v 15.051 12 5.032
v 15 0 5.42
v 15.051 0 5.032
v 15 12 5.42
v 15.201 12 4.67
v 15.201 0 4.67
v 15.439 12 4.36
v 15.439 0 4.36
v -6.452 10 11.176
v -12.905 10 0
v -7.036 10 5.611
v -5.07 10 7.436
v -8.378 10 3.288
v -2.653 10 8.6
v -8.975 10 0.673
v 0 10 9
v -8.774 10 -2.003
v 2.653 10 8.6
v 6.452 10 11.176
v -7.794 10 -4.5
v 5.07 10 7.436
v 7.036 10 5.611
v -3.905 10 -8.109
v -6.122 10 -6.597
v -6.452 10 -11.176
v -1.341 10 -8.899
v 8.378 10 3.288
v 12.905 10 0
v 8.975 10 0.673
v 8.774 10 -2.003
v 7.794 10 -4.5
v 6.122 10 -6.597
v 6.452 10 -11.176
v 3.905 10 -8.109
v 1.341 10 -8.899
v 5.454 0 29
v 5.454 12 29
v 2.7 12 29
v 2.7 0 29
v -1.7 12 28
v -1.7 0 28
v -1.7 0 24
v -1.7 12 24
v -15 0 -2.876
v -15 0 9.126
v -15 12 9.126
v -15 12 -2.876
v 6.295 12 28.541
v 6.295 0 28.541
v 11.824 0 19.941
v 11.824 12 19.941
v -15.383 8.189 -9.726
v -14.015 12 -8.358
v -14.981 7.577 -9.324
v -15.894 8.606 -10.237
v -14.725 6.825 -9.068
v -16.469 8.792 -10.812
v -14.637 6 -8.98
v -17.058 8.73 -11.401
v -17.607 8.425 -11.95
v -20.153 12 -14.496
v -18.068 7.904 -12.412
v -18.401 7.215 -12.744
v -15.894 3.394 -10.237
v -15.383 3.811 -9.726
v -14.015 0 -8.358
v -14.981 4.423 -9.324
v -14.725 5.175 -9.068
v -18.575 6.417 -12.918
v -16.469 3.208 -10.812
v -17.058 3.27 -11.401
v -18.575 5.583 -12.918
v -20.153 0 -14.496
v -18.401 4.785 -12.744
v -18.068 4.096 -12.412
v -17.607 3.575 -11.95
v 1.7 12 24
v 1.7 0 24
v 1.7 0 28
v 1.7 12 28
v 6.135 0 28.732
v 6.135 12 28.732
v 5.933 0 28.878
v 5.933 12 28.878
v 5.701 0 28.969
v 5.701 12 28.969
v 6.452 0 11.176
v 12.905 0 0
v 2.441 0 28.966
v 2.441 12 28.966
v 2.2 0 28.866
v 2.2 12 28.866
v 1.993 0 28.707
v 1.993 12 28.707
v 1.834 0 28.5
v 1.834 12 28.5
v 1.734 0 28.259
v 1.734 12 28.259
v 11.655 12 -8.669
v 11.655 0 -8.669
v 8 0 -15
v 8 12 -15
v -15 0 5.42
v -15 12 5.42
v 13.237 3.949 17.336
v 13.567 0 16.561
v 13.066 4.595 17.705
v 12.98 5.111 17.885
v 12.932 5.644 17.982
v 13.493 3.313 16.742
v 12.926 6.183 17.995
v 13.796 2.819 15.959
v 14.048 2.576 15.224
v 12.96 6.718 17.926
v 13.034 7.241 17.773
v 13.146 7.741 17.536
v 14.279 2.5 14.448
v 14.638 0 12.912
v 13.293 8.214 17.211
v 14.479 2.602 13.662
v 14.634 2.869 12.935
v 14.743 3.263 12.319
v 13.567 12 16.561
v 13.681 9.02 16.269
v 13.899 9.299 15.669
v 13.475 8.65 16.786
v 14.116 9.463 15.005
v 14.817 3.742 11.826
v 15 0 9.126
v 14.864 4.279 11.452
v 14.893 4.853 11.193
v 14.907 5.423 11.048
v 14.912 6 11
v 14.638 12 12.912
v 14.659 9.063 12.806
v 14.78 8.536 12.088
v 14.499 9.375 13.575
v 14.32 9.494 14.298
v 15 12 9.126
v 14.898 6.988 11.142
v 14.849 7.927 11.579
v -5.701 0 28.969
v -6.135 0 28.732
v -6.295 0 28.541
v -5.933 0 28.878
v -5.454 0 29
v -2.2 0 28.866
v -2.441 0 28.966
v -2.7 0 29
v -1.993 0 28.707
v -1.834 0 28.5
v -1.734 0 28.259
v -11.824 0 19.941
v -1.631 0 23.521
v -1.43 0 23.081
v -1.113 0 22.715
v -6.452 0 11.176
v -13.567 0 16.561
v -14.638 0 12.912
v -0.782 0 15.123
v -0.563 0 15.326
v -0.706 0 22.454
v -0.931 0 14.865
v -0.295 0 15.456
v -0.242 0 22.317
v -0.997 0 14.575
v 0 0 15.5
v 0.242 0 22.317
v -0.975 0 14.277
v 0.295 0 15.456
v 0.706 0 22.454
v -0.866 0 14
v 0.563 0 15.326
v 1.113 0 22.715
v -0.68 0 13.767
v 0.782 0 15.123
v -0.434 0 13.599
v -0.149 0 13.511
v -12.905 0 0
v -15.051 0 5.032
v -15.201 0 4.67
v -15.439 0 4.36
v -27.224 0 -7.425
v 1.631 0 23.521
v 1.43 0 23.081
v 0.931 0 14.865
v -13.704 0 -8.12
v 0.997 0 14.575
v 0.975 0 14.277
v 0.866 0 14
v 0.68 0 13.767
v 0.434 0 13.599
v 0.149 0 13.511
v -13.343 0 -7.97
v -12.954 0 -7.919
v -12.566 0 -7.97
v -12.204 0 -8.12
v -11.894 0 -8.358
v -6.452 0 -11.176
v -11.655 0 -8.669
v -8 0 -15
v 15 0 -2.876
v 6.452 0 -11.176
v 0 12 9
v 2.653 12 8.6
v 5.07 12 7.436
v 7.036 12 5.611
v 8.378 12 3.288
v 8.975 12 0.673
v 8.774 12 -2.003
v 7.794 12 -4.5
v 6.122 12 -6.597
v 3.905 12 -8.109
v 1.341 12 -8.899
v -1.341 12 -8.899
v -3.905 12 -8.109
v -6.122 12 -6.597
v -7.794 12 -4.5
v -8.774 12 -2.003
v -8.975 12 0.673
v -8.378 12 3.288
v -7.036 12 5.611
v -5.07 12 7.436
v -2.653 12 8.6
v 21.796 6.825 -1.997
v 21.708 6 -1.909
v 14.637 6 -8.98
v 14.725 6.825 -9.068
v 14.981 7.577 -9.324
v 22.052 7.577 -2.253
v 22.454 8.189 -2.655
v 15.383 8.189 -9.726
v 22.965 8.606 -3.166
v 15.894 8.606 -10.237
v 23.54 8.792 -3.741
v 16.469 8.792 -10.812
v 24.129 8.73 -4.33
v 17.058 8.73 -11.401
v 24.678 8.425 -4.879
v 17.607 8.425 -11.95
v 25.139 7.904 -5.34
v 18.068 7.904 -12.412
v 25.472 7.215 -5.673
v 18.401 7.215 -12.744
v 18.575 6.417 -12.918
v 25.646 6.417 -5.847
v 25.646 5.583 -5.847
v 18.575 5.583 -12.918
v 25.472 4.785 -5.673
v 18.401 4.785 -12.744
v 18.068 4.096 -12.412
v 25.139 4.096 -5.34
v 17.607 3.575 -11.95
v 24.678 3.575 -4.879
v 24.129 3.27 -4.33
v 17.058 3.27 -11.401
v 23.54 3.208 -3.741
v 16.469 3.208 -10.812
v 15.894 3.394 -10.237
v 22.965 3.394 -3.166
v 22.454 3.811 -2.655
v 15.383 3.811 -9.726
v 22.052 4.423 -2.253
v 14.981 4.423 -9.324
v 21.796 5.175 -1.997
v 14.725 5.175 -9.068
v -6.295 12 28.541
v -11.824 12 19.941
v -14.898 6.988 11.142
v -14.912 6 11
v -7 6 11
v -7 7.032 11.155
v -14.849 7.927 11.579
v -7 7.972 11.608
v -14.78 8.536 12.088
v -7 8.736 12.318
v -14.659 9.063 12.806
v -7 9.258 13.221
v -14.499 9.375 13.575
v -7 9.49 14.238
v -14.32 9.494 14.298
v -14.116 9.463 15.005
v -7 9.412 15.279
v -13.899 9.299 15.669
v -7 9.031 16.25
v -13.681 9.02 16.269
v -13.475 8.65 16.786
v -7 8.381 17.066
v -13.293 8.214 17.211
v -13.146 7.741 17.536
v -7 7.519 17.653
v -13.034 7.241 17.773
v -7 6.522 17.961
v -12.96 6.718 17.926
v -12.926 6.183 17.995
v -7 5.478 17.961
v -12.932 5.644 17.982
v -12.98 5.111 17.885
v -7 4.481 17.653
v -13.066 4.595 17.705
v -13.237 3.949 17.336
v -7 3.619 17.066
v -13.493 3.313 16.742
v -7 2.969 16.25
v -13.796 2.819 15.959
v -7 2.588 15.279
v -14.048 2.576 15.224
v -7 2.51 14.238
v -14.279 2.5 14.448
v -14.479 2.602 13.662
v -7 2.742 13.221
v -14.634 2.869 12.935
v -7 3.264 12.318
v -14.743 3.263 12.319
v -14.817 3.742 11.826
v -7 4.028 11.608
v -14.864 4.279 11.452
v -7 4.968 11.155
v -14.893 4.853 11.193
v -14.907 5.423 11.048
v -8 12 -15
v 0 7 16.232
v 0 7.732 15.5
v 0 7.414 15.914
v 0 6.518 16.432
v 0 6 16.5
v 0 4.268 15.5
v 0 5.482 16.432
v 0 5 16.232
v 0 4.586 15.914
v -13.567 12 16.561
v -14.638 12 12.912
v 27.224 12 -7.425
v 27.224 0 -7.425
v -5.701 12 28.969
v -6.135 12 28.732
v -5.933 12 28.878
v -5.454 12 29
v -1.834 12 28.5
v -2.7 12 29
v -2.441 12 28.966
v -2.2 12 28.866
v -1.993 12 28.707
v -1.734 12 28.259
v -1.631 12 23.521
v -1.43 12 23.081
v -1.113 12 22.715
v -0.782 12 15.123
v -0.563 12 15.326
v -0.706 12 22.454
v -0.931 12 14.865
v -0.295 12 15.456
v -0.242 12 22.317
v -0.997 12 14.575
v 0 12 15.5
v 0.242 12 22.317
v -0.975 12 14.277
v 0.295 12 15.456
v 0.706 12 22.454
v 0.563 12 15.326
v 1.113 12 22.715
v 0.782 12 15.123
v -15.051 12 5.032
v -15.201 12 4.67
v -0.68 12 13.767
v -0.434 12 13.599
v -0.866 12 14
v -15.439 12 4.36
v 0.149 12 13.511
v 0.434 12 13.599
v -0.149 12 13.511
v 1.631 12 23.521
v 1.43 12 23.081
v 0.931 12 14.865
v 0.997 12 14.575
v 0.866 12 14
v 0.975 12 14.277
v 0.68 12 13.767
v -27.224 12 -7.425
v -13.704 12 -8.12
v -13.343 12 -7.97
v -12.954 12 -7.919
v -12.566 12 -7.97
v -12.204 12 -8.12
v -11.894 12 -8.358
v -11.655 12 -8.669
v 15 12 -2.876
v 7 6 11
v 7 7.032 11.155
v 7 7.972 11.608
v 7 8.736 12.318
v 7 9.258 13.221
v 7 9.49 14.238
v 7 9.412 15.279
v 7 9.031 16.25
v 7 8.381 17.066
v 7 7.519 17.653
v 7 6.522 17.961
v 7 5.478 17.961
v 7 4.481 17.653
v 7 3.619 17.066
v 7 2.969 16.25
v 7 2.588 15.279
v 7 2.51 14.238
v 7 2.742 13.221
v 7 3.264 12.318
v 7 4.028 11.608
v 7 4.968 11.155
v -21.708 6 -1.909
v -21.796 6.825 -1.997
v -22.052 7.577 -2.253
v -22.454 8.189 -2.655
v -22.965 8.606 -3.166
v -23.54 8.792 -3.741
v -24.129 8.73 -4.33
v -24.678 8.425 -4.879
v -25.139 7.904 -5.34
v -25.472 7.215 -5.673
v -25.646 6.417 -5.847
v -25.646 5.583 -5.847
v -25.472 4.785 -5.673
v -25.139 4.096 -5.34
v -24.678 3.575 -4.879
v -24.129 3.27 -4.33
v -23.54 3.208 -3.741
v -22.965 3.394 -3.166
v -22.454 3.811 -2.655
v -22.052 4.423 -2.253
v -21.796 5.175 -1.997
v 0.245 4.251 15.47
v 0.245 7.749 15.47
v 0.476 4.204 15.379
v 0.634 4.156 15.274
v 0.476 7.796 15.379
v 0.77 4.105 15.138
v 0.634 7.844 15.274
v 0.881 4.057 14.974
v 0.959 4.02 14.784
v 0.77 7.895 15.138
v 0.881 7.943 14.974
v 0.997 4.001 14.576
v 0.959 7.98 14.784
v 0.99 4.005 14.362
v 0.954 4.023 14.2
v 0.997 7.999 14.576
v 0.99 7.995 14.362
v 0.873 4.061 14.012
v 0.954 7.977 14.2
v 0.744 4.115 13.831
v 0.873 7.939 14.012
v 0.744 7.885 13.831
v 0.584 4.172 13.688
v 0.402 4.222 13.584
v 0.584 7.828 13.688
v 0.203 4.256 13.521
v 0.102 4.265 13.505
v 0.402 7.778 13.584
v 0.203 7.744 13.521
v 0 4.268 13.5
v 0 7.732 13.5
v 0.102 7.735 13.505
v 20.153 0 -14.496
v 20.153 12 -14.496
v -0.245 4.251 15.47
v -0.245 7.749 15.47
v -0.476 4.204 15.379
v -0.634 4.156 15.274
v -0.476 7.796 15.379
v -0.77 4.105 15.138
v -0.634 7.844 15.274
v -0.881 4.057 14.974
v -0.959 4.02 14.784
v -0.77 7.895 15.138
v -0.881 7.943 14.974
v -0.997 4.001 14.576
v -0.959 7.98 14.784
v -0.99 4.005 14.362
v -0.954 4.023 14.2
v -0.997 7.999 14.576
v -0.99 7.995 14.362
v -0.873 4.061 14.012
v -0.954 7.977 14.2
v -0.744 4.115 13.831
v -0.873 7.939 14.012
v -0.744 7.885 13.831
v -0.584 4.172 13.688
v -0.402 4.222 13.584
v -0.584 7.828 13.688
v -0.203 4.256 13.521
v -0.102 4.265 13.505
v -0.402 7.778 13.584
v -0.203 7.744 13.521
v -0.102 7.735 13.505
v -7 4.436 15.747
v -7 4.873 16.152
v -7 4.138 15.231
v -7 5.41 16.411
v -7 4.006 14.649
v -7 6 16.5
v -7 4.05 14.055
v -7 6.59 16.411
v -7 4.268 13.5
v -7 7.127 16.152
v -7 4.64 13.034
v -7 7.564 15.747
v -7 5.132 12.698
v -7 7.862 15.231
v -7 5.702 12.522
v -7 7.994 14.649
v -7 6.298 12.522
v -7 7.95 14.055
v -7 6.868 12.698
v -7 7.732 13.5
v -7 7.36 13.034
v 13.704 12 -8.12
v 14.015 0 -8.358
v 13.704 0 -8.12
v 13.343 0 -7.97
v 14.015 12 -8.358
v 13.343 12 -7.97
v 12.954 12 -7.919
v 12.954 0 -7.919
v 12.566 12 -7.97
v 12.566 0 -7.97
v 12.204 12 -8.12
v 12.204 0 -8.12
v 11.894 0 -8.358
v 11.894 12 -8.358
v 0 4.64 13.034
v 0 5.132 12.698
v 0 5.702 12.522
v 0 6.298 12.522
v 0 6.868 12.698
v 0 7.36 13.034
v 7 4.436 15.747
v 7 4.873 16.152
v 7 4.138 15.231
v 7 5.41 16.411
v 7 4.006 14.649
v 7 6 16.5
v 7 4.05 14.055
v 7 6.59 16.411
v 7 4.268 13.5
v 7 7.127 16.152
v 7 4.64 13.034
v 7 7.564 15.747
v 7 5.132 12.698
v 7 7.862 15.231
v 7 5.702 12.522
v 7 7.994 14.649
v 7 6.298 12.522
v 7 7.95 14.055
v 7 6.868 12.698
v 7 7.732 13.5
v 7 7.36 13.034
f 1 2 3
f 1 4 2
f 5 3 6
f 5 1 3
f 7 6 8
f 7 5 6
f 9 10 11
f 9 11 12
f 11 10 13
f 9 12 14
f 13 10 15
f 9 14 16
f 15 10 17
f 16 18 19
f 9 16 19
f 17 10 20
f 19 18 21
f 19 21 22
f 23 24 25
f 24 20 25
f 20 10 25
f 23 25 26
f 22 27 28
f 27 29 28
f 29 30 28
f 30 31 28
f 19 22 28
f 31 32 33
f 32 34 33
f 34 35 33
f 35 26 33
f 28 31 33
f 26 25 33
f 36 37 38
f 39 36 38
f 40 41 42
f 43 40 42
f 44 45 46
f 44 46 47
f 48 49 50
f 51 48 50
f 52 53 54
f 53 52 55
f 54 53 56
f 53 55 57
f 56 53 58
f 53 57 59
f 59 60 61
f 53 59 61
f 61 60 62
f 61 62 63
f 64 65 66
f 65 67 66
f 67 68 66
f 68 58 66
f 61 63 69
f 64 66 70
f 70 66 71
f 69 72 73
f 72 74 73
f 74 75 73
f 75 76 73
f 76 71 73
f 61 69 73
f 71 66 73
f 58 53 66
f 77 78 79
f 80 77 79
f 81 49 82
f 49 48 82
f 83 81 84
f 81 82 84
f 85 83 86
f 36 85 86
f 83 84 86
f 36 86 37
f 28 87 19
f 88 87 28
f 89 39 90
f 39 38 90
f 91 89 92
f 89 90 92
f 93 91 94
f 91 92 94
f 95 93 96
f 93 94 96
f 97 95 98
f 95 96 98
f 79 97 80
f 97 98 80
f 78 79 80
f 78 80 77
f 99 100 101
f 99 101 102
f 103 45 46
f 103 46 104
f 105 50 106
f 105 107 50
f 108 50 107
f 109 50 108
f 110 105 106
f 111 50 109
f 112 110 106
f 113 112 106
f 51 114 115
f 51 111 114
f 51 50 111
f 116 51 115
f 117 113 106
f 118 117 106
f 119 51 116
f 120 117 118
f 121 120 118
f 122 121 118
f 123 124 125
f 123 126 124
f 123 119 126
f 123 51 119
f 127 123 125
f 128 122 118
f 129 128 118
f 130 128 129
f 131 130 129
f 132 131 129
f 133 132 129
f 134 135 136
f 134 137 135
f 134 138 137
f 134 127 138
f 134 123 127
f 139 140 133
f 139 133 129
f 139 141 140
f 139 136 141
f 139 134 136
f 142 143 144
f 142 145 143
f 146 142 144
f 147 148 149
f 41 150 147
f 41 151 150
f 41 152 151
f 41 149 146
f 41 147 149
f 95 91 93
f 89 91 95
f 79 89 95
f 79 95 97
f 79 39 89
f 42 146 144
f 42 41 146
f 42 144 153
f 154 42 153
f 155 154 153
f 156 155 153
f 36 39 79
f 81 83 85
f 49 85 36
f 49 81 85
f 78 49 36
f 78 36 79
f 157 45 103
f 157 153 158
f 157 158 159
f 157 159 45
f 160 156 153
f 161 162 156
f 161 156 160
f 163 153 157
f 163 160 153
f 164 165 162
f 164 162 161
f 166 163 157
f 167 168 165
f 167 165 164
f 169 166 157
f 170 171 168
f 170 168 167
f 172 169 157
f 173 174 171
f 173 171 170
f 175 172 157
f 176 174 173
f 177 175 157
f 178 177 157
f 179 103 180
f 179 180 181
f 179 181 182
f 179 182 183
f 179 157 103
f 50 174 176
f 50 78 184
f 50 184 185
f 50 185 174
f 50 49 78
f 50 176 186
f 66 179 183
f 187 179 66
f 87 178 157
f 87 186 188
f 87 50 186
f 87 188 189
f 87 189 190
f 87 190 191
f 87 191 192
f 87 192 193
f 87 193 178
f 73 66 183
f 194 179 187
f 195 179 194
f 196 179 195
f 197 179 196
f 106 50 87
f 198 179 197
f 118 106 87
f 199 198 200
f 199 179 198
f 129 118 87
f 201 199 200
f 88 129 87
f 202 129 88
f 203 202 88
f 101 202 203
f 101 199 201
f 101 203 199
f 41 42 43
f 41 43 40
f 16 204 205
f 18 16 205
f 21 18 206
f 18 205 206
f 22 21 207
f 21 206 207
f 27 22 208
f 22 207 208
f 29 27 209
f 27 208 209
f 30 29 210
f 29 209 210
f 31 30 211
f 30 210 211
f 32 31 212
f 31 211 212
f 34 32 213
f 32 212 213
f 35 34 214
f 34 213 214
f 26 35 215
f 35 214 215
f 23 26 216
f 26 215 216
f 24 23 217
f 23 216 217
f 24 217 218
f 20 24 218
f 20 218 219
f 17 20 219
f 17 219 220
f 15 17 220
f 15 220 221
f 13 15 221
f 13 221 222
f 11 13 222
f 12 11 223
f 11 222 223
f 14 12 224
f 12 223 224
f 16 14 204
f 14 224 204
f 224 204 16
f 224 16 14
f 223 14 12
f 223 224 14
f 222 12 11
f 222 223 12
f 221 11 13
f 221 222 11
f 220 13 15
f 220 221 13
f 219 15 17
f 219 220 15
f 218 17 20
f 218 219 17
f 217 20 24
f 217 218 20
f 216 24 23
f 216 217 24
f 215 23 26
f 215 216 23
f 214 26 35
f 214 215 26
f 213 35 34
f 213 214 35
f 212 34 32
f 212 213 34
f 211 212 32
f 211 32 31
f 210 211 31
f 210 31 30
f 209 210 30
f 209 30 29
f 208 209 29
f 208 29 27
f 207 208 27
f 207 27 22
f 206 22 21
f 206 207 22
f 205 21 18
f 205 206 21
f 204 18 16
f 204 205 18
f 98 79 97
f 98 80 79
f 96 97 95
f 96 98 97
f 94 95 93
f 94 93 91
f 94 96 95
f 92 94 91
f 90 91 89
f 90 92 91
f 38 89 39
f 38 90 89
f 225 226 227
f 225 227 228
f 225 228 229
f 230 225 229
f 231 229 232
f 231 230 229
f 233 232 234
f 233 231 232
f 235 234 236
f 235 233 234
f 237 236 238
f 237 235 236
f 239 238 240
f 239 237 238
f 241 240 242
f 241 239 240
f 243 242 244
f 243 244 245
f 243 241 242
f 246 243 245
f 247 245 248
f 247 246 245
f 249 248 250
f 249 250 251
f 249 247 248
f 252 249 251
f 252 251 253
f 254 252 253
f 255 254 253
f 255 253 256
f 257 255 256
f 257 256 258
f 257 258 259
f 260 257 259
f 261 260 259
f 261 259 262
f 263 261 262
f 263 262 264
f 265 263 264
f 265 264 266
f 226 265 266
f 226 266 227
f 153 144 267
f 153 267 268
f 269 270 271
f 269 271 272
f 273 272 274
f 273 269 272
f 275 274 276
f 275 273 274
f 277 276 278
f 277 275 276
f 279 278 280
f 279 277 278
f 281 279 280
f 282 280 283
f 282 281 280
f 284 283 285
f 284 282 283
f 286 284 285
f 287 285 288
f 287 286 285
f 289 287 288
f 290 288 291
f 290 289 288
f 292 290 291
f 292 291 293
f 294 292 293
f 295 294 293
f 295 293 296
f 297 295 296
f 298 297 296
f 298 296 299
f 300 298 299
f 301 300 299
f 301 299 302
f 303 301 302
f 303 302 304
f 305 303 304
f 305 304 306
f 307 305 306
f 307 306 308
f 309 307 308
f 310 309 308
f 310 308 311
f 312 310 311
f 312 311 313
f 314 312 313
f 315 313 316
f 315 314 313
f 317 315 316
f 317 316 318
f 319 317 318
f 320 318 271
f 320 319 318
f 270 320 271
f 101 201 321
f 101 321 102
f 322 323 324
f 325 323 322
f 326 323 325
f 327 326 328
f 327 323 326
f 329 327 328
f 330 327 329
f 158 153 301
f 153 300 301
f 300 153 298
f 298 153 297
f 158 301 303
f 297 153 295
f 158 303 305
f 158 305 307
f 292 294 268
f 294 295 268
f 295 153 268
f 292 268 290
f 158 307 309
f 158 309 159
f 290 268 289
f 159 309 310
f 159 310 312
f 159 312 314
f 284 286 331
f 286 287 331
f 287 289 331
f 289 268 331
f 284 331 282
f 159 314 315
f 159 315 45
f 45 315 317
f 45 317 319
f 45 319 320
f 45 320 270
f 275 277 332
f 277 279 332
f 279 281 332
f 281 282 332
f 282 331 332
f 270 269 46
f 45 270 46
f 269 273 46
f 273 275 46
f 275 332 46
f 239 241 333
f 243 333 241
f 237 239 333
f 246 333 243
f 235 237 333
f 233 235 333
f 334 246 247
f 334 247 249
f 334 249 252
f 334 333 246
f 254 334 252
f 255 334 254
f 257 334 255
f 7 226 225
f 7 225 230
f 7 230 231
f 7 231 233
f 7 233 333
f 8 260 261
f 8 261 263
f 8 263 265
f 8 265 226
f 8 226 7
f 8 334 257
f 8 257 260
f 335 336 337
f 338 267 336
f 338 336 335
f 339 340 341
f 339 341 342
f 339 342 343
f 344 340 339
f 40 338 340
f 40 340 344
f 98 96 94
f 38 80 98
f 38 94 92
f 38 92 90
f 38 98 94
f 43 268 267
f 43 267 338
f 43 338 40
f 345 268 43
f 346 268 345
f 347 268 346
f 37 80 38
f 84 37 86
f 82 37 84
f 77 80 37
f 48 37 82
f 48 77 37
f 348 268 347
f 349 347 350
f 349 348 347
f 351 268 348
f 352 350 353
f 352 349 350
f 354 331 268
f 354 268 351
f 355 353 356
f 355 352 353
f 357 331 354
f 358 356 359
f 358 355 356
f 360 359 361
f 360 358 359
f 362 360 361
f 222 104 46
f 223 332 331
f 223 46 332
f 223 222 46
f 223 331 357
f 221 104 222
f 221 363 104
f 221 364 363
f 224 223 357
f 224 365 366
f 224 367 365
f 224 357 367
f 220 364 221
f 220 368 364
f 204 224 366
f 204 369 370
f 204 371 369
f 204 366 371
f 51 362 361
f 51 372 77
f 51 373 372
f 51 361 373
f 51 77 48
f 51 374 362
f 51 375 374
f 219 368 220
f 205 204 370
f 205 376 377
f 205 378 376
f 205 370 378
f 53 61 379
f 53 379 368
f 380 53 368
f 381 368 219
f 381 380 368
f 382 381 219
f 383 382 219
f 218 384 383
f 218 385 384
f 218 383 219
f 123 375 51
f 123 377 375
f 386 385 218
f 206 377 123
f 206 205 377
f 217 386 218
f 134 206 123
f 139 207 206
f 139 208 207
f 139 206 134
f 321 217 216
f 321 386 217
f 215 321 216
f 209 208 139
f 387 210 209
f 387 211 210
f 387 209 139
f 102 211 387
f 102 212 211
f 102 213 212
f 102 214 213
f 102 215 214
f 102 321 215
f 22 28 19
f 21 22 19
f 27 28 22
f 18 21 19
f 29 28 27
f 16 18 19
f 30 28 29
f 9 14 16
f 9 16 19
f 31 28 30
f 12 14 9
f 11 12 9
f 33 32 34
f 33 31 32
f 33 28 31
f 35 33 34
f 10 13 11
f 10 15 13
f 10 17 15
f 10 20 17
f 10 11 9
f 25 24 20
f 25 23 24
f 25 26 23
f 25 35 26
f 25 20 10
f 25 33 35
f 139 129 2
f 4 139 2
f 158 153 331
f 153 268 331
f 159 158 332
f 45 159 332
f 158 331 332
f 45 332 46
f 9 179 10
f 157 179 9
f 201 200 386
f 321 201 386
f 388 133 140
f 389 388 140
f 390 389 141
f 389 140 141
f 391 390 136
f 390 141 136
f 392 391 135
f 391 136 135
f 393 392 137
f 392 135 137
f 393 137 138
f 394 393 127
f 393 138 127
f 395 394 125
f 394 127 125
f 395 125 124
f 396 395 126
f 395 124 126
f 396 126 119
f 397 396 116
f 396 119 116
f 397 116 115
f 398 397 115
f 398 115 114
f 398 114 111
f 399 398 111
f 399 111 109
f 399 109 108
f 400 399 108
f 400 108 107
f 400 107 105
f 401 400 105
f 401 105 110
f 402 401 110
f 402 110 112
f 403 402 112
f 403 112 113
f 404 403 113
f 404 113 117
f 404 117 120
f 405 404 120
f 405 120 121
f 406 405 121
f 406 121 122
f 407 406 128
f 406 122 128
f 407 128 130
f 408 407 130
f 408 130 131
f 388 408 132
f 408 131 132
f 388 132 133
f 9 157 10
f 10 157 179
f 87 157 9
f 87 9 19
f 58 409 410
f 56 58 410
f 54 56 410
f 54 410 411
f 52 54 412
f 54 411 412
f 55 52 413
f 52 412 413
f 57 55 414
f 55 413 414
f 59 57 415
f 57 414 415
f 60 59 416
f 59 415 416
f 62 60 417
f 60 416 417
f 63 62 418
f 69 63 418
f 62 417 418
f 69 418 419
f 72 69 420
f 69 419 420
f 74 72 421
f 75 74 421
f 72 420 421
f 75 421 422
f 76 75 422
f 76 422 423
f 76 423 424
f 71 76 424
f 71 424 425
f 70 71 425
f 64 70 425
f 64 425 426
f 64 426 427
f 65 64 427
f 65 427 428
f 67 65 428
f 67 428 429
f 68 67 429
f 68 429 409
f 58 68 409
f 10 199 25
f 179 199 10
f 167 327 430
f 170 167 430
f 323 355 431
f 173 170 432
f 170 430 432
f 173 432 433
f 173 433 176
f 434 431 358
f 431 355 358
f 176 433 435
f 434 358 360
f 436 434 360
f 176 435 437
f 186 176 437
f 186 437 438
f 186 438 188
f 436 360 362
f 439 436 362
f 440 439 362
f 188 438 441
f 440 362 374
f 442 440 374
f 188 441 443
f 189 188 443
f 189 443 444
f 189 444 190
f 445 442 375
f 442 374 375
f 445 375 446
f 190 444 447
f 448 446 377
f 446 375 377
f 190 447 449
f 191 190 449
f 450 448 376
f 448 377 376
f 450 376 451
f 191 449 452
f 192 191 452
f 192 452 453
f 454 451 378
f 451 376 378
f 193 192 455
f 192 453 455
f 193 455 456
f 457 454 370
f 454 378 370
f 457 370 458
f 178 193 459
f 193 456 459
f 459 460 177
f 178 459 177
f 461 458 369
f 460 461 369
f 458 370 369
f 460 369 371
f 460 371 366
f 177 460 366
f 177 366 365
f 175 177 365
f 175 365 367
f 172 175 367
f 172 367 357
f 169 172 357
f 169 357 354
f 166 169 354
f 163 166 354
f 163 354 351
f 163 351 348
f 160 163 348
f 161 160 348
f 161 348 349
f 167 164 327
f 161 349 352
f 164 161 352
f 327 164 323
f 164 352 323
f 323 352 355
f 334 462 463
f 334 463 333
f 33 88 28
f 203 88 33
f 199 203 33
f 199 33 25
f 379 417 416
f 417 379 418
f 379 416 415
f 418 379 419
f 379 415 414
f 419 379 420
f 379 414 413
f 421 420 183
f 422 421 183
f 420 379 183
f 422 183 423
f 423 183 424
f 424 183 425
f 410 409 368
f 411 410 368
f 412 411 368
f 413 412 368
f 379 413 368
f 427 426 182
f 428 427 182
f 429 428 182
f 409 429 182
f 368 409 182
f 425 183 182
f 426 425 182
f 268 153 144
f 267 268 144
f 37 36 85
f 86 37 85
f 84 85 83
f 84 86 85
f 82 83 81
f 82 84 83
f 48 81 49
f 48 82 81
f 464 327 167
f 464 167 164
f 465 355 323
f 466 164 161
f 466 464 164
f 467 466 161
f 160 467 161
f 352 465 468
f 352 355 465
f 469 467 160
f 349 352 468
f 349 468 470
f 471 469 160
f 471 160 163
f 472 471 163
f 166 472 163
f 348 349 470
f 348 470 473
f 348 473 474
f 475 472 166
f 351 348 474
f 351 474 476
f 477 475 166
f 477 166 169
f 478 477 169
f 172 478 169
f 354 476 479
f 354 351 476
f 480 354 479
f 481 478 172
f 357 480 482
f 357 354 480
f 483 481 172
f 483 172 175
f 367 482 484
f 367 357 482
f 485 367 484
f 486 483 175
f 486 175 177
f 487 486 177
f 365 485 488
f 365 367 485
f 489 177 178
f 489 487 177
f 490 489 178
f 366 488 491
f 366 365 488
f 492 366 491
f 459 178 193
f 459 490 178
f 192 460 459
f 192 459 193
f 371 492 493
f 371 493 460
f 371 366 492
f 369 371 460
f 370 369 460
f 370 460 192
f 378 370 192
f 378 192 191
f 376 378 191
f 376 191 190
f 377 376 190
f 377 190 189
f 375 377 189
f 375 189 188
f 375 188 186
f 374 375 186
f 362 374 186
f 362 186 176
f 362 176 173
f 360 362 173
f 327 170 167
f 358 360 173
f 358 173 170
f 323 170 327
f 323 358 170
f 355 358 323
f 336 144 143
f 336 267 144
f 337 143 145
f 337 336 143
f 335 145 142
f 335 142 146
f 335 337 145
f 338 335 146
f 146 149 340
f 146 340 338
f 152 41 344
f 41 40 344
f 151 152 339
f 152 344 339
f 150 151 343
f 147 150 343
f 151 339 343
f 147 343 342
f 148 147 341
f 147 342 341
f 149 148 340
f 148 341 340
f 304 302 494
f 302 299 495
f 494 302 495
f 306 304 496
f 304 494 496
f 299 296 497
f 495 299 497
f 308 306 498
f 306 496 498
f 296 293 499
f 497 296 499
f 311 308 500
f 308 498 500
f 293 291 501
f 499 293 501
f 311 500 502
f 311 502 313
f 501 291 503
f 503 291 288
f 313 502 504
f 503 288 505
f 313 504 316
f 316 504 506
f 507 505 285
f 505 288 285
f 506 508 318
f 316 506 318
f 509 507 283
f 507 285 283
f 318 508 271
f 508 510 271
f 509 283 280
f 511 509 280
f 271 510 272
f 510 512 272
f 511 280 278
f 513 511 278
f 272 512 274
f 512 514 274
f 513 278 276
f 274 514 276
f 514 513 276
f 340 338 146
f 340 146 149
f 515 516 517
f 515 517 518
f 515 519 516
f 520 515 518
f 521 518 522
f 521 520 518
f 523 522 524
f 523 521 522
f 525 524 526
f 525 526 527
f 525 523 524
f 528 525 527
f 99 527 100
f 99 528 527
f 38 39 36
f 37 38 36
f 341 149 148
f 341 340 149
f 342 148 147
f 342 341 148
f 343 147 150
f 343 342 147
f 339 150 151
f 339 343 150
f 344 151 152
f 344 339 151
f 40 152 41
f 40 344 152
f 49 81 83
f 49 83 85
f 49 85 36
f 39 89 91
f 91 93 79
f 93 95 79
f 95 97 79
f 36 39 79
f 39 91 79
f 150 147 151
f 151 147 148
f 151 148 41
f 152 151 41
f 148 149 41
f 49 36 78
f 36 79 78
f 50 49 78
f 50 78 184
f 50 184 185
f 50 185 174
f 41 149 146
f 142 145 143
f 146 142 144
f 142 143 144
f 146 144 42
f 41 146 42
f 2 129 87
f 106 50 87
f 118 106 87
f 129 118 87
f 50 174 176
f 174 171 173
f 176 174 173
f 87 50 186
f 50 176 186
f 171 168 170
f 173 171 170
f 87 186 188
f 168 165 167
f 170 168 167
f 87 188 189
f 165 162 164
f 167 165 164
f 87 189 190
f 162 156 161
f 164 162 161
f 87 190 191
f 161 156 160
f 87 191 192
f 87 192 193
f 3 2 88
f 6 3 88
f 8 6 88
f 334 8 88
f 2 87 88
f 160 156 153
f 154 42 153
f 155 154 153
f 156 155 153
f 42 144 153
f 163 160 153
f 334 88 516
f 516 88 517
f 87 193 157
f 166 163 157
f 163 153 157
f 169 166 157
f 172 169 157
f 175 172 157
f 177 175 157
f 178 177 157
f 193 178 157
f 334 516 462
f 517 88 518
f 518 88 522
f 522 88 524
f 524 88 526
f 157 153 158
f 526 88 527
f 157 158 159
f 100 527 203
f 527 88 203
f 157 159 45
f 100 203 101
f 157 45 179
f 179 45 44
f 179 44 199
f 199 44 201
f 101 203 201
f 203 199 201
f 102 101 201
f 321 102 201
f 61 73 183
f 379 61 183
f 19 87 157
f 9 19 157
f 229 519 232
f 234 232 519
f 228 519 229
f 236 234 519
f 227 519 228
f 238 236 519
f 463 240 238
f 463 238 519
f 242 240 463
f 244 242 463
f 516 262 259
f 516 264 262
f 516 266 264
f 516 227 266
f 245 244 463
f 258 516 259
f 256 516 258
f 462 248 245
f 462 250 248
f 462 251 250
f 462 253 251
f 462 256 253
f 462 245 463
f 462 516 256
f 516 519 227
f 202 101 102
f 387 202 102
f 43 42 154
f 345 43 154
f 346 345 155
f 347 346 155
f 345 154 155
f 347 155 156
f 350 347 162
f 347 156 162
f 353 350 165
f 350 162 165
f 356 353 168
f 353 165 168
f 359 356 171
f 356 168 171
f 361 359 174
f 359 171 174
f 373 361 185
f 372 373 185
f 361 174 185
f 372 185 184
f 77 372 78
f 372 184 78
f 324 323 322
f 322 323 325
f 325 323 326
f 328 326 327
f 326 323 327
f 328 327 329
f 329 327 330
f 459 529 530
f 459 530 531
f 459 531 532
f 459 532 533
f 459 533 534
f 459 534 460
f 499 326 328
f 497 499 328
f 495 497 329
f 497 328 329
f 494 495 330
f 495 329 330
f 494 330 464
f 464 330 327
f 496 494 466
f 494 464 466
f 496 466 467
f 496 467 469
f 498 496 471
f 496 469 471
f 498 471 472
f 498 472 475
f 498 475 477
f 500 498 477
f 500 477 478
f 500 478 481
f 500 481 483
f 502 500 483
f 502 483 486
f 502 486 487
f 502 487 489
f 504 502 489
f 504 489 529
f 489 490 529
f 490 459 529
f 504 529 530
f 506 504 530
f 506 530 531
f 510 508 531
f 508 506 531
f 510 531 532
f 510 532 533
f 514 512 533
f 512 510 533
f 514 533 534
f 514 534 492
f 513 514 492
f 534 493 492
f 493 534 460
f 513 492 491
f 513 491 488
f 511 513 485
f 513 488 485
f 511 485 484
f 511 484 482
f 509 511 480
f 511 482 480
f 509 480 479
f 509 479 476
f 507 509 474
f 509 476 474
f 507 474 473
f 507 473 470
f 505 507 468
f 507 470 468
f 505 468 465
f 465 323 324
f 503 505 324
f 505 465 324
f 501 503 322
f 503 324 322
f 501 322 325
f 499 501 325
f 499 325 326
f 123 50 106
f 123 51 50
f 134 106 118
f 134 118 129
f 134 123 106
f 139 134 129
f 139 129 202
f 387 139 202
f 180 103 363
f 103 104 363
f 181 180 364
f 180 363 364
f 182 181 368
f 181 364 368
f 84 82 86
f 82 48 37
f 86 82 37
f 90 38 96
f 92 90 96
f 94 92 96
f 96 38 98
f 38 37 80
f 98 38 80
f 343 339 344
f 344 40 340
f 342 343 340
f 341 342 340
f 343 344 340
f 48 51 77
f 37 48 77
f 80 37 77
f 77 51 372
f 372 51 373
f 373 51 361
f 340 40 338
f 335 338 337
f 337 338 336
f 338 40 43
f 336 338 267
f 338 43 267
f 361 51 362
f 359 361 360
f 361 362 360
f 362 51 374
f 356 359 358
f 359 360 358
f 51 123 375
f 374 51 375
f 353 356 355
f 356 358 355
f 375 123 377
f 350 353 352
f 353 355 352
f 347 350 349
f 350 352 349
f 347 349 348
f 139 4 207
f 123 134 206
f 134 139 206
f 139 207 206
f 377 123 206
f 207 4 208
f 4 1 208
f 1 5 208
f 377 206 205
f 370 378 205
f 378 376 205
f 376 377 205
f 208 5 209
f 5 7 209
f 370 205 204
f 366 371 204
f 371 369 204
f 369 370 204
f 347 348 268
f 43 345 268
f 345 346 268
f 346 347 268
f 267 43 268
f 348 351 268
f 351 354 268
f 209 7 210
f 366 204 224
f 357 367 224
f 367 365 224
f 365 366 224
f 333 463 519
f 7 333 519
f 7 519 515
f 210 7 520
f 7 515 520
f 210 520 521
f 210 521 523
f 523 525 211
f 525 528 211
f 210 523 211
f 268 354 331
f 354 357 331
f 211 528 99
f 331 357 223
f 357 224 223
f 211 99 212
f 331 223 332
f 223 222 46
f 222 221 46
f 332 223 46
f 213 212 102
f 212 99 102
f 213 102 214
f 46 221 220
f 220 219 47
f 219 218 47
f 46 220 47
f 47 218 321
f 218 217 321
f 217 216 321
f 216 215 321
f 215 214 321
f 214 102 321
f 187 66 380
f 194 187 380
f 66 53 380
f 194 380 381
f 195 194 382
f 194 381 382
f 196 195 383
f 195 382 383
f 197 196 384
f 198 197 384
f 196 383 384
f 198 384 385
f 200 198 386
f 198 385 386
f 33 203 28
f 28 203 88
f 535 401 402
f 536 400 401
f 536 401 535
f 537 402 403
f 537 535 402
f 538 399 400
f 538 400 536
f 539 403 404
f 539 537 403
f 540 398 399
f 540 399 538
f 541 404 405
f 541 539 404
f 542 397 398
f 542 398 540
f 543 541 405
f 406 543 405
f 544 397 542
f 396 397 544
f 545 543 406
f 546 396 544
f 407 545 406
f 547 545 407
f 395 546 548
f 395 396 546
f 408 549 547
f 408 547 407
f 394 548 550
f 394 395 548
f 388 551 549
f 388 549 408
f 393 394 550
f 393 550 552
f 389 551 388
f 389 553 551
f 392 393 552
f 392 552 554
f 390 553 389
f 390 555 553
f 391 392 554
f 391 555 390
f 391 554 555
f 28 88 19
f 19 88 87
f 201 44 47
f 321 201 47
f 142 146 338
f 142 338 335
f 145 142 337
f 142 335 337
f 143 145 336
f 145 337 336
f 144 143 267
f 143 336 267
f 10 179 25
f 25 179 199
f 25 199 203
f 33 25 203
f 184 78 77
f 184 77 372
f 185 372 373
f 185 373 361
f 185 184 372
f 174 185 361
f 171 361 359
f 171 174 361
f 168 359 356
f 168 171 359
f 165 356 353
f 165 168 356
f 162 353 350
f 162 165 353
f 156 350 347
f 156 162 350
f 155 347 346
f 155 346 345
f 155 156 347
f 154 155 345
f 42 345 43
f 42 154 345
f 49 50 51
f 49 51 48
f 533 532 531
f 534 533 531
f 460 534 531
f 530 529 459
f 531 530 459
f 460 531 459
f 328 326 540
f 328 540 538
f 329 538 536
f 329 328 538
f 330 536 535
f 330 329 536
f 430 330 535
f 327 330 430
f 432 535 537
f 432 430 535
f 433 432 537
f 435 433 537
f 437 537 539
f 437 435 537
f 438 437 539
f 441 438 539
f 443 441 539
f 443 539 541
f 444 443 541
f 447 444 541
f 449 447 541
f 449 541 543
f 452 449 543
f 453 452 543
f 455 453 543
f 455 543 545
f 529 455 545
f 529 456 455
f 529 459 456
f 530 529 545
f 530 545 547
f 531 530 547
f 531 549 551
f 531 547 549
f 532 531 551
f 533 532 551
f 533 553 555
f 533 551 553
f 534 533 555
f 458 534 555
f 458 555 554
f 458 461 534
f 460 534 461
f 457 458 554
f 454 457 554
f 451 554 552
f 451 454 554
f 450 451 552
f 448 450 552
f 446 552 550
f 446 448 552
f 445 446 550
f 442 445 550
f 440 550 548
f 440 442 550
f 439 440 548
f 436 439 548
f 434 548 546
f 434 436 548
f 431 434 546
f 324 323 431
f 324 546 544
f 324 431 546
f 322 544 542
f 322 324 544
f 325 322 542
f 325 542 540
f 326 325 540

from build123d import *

# Parameters (mm, degrees)
SKETCH1_W           = 30
SKETCH1_H           = 30
BOSS_EXTRUDE1_DEPTH = 12
BOSS_EXTRUDE6_DEPTH = 12
CHAMFER1_SIZE       = 7
CHAMFER1_SIZE2      = 12.124355653
BOSS_EXTRUDE4_DEPTH = 12
SKETCH7_R           = 2.8
CUT_EXTRUDE2_DEPTH  = 15
CHAMFER2_SIZE       = 9
CHAMFER2_SIZE_2     = 14
CHAMFER3_SIZE       = 14
CHAMFER3_SIZE_2     = 9
FILLET2_R           = 20
FILLET3_R           = 1
FILLET4_R           = 1.5
SKETCH10_R          = 1
CUT_EXTRUDE3_DEPTH  = 42.546660516
SKETCH11_R          = 2
CUT_EXTRUDE4_DEPTH  = 42.546660516
SKETCH12_R          = 9
BOSS_EXTRUDE8_DEPTH = 2
SKETCH13_R          = 3.5
CUT_EXTRUDE5_DEPTH  = 8


with BuildPart() as part:
    # Sketch1 → Boss-Extrude1 (new body)
    with BuildSketch(Plane(origin=(0, 0, 0), x_dir=(1, 0, 0), z_dir=(0, 1, 0))):
        Rectangle(SKETCH1_W, SKETCH1_H)
        Polygon((6.452466608, -11.176), (12.904933217, 0), (6.452466608, 11.176), (-6.452466608, 11.176), (-12.904933217, 0), (-6.452466608, -11.176), align=None, mode=Mode.SUBTRACT)
    extrude(amount=BOSS_EXTRUDE1_DEPTH)

    # Sketch8 → Boss-Extrude6 (add)
    with BuildSketch(Plane(origin=(0, 0, 0), x_dir=(1, 0, 0), z_dir=(0, 1, 0))):
        with BuildLine():
            Line((-6, -15), (6, -15))
            Line((6, -15), (6, -29))
            Line((6, -29), (1.7, -29))
            Line((1.7, -29), (1.7, -24))
            ThreePointArc((1.7, -24), (0, -22.3), (-1.7, -24))
            Line((-1.7, -24), (-1.7, -29))
            Line((-1.7, -29), (-6, -29))
            Line((-6, -29), (-6, -15))
        make_face()
    extrude(amount=BOSS_EXTRUDE6_DEPTH)

    # Chamfer1
    chamfer1_edges = [part.edges().sort_by_distance(p)[0] for p in [
        (-15, 6, -15),
        (15, 6, -15),
    ]]
    chamfer1_side = [part.faces().sort_by_distance(p)[0] for p in [
        (0, 6, -15),
    ]]
    chamfer(chamfer1_edges, length=CHAMFER1_SIZE, length2=CHAMFER1_SIZE2, reference=chamfer1_side[0])

    # Sketch6 → Boss-Extrude4 (add)
    with BuildSketch(Plane(origin=(0, 0, 0), x_dir=(1, 0, 0), z_dir=(0, 1, 0))):
        Polygon((-27.223611076, 7.424621202), (-15, -4.798989873), (-15, 2.875644347), (-12.632730187, 6.975875938), (-20.152543264, 14.495689014), align=None)
    extrude(amount=BOSS_EXTRUDE4_DEPTH)

    # Sketch7 → Cut-Extrude2 (cut)
    with BuildSketch(Plane(origin=(-9.899494937, 0, 9.899494937), x_dir=(0.7071067811865438, 0, 0.7071067811865512), z_dir=(-0.7071067811865512, 0, 0.7071067811865438))):
        with Locations((-19.5, 6)):
            Circle(SKETCH7_R)
    extrude(amount=-CUT_EXTRUDE2_DEPTH, mode=Mode.SUBTRACT)

    # Chamfer2
    # the kernel refuses this chamfer: 14, 9 mm, written as the material it adds along each edge
    with BuildSketch(Plane(origin=(6, 0, 15), x_dir=(0.9987204462012896, 0, -0.05057143798130468), z_dir=(0, 1, 0))) as chamfer2_piece_1:
        Polygon((CHAMFER2_SIZE * 0.998720446201, -CHAMFER2_SIZE * 0.0505714379813), (-CHAMFER2_SIZE_2 * 0.0505714379813, -CHAMFER2_SIZE_2 * 0.998720446201), (0, 0), align=None)
    extrude(amount=12)

    # Chamfer3
    # the kernel refuses this chamfer: 14, 9 mm, written as the material it adds along each edge
    with BuildSketch(Plane(origin=(-6, 0, 15), x_dir=(0.020921616646829202, 0, 0.9997811190240007), z_dir=(0, 1, 0))) as chamfer3_piece_1:
        Polygon((CHAMFER3_SIZE * 0.999781119024, -CHAMFER3_SIZE * 0.0209216166468), (-CHAMFER3_SIZE_2 * 0.0209216166468, -CHAMFER3_SIZE_2 * 0.999781119024), (0, 0), align=None)
    extrude(amount=12)

    # Fillet2
    fillet2_edges = [part.edges().sort_by_distance(p)[0] for p in [
        (15, 6, 15),
        (-15, 6, 15),
    ]]
    fillet(fillet2_edges, radius=FILLET2_R)

    # Fillet3
    fillet3_edges = [part.edges().sort_by_distance(p)[0] for p in [
        (-6, 6, 29),
        (-1.7, 6, 29),
        (1.7, 6, 29),
        (6, 6, 29),
    ]]
    fillet(fillet3_edges, radius=FILLET3_R)

    # Fillet4
    fillet4_edges = [part.edges().sort_by_distance(p)[0] for p in [
        (-15, 6, 4.798989873),
        (-12.632730187, 6, -6.975875938),
    ]]
    fillet(fillet4_edges, radius=FILLET4_R)

    # Sketch10 → Cut-Extrude3 (cut, through all)
    with BuildSketch(Plane(origin=(0, 12, 0), x_dir=(1, 0, 0), z_dir=(0, 1, 0))):
        with Locations(Location((0, -14.5, 0), (0, 0, 270))):
            Circle(SKETCH10_R)
    extrude(amount=-CUT_EXTRUDE3_DEPTH, mode=Mode.SUBTRACT)

    # Sketch11 → Cut-Extrude4 (cut, through all)
    with BuildSketch(Plane(origin=(0, 0, 0), x_dir=(0, 0, -1), z_dir=(1, 0, 0))):
        with Locations(Location((-14.5, 6, 0), (0, 0, 180))):
            Circle(SKETCH11_R)
    extrude(amount=CUT_EXTRUDE4_DEPTH, mode=Mode.SUBTRACT)

    # Sketch12 → Boss-Extrude8 (add)
    with BuildSketch(Plane(origin=(0, 12, 0), x_dir=(1, 0, 0), z_dir=(0, 1, 0))):
        Polygon((6.452466608, 11.176), (-6.452466608, 11.176), (-12.904933217, 0), (-6.452466608, -11.176), (6.452466608, -11.176), (12.904933217, 0), align=None)
        with Locations(Location((0, 0, 0), (0, 0, 270))):
            Circle(SKETCH12_R, mode=Mode.SUBTRACT)
    extrude(amount=-BOSS_EXTRUDE8_DEPTH)

    # Sketch13 → Cut-Extrude5 (cut)
    with BuildSketch(Plane(origin=(15, 0, 0), x_dir=(0, 0, -1), z_dir=(1, 0, 0))):
        with Locations((-14.5, 6)):
            Circle(SKETCH13_R)
    extrude(amount=-CUT_EXTRUDE5_DEPTH, mode=Mode.SUBTRACT)


with BuildPart() as body_2:
    # Mirror2: mirrored copy
    add(part.part.mirror(Plane(origin=(0, 0, 0), x_dir=(0, 0, 1), z_dir=(1, 0, 0))))


solid = Compound([part.part, body_2.part])
